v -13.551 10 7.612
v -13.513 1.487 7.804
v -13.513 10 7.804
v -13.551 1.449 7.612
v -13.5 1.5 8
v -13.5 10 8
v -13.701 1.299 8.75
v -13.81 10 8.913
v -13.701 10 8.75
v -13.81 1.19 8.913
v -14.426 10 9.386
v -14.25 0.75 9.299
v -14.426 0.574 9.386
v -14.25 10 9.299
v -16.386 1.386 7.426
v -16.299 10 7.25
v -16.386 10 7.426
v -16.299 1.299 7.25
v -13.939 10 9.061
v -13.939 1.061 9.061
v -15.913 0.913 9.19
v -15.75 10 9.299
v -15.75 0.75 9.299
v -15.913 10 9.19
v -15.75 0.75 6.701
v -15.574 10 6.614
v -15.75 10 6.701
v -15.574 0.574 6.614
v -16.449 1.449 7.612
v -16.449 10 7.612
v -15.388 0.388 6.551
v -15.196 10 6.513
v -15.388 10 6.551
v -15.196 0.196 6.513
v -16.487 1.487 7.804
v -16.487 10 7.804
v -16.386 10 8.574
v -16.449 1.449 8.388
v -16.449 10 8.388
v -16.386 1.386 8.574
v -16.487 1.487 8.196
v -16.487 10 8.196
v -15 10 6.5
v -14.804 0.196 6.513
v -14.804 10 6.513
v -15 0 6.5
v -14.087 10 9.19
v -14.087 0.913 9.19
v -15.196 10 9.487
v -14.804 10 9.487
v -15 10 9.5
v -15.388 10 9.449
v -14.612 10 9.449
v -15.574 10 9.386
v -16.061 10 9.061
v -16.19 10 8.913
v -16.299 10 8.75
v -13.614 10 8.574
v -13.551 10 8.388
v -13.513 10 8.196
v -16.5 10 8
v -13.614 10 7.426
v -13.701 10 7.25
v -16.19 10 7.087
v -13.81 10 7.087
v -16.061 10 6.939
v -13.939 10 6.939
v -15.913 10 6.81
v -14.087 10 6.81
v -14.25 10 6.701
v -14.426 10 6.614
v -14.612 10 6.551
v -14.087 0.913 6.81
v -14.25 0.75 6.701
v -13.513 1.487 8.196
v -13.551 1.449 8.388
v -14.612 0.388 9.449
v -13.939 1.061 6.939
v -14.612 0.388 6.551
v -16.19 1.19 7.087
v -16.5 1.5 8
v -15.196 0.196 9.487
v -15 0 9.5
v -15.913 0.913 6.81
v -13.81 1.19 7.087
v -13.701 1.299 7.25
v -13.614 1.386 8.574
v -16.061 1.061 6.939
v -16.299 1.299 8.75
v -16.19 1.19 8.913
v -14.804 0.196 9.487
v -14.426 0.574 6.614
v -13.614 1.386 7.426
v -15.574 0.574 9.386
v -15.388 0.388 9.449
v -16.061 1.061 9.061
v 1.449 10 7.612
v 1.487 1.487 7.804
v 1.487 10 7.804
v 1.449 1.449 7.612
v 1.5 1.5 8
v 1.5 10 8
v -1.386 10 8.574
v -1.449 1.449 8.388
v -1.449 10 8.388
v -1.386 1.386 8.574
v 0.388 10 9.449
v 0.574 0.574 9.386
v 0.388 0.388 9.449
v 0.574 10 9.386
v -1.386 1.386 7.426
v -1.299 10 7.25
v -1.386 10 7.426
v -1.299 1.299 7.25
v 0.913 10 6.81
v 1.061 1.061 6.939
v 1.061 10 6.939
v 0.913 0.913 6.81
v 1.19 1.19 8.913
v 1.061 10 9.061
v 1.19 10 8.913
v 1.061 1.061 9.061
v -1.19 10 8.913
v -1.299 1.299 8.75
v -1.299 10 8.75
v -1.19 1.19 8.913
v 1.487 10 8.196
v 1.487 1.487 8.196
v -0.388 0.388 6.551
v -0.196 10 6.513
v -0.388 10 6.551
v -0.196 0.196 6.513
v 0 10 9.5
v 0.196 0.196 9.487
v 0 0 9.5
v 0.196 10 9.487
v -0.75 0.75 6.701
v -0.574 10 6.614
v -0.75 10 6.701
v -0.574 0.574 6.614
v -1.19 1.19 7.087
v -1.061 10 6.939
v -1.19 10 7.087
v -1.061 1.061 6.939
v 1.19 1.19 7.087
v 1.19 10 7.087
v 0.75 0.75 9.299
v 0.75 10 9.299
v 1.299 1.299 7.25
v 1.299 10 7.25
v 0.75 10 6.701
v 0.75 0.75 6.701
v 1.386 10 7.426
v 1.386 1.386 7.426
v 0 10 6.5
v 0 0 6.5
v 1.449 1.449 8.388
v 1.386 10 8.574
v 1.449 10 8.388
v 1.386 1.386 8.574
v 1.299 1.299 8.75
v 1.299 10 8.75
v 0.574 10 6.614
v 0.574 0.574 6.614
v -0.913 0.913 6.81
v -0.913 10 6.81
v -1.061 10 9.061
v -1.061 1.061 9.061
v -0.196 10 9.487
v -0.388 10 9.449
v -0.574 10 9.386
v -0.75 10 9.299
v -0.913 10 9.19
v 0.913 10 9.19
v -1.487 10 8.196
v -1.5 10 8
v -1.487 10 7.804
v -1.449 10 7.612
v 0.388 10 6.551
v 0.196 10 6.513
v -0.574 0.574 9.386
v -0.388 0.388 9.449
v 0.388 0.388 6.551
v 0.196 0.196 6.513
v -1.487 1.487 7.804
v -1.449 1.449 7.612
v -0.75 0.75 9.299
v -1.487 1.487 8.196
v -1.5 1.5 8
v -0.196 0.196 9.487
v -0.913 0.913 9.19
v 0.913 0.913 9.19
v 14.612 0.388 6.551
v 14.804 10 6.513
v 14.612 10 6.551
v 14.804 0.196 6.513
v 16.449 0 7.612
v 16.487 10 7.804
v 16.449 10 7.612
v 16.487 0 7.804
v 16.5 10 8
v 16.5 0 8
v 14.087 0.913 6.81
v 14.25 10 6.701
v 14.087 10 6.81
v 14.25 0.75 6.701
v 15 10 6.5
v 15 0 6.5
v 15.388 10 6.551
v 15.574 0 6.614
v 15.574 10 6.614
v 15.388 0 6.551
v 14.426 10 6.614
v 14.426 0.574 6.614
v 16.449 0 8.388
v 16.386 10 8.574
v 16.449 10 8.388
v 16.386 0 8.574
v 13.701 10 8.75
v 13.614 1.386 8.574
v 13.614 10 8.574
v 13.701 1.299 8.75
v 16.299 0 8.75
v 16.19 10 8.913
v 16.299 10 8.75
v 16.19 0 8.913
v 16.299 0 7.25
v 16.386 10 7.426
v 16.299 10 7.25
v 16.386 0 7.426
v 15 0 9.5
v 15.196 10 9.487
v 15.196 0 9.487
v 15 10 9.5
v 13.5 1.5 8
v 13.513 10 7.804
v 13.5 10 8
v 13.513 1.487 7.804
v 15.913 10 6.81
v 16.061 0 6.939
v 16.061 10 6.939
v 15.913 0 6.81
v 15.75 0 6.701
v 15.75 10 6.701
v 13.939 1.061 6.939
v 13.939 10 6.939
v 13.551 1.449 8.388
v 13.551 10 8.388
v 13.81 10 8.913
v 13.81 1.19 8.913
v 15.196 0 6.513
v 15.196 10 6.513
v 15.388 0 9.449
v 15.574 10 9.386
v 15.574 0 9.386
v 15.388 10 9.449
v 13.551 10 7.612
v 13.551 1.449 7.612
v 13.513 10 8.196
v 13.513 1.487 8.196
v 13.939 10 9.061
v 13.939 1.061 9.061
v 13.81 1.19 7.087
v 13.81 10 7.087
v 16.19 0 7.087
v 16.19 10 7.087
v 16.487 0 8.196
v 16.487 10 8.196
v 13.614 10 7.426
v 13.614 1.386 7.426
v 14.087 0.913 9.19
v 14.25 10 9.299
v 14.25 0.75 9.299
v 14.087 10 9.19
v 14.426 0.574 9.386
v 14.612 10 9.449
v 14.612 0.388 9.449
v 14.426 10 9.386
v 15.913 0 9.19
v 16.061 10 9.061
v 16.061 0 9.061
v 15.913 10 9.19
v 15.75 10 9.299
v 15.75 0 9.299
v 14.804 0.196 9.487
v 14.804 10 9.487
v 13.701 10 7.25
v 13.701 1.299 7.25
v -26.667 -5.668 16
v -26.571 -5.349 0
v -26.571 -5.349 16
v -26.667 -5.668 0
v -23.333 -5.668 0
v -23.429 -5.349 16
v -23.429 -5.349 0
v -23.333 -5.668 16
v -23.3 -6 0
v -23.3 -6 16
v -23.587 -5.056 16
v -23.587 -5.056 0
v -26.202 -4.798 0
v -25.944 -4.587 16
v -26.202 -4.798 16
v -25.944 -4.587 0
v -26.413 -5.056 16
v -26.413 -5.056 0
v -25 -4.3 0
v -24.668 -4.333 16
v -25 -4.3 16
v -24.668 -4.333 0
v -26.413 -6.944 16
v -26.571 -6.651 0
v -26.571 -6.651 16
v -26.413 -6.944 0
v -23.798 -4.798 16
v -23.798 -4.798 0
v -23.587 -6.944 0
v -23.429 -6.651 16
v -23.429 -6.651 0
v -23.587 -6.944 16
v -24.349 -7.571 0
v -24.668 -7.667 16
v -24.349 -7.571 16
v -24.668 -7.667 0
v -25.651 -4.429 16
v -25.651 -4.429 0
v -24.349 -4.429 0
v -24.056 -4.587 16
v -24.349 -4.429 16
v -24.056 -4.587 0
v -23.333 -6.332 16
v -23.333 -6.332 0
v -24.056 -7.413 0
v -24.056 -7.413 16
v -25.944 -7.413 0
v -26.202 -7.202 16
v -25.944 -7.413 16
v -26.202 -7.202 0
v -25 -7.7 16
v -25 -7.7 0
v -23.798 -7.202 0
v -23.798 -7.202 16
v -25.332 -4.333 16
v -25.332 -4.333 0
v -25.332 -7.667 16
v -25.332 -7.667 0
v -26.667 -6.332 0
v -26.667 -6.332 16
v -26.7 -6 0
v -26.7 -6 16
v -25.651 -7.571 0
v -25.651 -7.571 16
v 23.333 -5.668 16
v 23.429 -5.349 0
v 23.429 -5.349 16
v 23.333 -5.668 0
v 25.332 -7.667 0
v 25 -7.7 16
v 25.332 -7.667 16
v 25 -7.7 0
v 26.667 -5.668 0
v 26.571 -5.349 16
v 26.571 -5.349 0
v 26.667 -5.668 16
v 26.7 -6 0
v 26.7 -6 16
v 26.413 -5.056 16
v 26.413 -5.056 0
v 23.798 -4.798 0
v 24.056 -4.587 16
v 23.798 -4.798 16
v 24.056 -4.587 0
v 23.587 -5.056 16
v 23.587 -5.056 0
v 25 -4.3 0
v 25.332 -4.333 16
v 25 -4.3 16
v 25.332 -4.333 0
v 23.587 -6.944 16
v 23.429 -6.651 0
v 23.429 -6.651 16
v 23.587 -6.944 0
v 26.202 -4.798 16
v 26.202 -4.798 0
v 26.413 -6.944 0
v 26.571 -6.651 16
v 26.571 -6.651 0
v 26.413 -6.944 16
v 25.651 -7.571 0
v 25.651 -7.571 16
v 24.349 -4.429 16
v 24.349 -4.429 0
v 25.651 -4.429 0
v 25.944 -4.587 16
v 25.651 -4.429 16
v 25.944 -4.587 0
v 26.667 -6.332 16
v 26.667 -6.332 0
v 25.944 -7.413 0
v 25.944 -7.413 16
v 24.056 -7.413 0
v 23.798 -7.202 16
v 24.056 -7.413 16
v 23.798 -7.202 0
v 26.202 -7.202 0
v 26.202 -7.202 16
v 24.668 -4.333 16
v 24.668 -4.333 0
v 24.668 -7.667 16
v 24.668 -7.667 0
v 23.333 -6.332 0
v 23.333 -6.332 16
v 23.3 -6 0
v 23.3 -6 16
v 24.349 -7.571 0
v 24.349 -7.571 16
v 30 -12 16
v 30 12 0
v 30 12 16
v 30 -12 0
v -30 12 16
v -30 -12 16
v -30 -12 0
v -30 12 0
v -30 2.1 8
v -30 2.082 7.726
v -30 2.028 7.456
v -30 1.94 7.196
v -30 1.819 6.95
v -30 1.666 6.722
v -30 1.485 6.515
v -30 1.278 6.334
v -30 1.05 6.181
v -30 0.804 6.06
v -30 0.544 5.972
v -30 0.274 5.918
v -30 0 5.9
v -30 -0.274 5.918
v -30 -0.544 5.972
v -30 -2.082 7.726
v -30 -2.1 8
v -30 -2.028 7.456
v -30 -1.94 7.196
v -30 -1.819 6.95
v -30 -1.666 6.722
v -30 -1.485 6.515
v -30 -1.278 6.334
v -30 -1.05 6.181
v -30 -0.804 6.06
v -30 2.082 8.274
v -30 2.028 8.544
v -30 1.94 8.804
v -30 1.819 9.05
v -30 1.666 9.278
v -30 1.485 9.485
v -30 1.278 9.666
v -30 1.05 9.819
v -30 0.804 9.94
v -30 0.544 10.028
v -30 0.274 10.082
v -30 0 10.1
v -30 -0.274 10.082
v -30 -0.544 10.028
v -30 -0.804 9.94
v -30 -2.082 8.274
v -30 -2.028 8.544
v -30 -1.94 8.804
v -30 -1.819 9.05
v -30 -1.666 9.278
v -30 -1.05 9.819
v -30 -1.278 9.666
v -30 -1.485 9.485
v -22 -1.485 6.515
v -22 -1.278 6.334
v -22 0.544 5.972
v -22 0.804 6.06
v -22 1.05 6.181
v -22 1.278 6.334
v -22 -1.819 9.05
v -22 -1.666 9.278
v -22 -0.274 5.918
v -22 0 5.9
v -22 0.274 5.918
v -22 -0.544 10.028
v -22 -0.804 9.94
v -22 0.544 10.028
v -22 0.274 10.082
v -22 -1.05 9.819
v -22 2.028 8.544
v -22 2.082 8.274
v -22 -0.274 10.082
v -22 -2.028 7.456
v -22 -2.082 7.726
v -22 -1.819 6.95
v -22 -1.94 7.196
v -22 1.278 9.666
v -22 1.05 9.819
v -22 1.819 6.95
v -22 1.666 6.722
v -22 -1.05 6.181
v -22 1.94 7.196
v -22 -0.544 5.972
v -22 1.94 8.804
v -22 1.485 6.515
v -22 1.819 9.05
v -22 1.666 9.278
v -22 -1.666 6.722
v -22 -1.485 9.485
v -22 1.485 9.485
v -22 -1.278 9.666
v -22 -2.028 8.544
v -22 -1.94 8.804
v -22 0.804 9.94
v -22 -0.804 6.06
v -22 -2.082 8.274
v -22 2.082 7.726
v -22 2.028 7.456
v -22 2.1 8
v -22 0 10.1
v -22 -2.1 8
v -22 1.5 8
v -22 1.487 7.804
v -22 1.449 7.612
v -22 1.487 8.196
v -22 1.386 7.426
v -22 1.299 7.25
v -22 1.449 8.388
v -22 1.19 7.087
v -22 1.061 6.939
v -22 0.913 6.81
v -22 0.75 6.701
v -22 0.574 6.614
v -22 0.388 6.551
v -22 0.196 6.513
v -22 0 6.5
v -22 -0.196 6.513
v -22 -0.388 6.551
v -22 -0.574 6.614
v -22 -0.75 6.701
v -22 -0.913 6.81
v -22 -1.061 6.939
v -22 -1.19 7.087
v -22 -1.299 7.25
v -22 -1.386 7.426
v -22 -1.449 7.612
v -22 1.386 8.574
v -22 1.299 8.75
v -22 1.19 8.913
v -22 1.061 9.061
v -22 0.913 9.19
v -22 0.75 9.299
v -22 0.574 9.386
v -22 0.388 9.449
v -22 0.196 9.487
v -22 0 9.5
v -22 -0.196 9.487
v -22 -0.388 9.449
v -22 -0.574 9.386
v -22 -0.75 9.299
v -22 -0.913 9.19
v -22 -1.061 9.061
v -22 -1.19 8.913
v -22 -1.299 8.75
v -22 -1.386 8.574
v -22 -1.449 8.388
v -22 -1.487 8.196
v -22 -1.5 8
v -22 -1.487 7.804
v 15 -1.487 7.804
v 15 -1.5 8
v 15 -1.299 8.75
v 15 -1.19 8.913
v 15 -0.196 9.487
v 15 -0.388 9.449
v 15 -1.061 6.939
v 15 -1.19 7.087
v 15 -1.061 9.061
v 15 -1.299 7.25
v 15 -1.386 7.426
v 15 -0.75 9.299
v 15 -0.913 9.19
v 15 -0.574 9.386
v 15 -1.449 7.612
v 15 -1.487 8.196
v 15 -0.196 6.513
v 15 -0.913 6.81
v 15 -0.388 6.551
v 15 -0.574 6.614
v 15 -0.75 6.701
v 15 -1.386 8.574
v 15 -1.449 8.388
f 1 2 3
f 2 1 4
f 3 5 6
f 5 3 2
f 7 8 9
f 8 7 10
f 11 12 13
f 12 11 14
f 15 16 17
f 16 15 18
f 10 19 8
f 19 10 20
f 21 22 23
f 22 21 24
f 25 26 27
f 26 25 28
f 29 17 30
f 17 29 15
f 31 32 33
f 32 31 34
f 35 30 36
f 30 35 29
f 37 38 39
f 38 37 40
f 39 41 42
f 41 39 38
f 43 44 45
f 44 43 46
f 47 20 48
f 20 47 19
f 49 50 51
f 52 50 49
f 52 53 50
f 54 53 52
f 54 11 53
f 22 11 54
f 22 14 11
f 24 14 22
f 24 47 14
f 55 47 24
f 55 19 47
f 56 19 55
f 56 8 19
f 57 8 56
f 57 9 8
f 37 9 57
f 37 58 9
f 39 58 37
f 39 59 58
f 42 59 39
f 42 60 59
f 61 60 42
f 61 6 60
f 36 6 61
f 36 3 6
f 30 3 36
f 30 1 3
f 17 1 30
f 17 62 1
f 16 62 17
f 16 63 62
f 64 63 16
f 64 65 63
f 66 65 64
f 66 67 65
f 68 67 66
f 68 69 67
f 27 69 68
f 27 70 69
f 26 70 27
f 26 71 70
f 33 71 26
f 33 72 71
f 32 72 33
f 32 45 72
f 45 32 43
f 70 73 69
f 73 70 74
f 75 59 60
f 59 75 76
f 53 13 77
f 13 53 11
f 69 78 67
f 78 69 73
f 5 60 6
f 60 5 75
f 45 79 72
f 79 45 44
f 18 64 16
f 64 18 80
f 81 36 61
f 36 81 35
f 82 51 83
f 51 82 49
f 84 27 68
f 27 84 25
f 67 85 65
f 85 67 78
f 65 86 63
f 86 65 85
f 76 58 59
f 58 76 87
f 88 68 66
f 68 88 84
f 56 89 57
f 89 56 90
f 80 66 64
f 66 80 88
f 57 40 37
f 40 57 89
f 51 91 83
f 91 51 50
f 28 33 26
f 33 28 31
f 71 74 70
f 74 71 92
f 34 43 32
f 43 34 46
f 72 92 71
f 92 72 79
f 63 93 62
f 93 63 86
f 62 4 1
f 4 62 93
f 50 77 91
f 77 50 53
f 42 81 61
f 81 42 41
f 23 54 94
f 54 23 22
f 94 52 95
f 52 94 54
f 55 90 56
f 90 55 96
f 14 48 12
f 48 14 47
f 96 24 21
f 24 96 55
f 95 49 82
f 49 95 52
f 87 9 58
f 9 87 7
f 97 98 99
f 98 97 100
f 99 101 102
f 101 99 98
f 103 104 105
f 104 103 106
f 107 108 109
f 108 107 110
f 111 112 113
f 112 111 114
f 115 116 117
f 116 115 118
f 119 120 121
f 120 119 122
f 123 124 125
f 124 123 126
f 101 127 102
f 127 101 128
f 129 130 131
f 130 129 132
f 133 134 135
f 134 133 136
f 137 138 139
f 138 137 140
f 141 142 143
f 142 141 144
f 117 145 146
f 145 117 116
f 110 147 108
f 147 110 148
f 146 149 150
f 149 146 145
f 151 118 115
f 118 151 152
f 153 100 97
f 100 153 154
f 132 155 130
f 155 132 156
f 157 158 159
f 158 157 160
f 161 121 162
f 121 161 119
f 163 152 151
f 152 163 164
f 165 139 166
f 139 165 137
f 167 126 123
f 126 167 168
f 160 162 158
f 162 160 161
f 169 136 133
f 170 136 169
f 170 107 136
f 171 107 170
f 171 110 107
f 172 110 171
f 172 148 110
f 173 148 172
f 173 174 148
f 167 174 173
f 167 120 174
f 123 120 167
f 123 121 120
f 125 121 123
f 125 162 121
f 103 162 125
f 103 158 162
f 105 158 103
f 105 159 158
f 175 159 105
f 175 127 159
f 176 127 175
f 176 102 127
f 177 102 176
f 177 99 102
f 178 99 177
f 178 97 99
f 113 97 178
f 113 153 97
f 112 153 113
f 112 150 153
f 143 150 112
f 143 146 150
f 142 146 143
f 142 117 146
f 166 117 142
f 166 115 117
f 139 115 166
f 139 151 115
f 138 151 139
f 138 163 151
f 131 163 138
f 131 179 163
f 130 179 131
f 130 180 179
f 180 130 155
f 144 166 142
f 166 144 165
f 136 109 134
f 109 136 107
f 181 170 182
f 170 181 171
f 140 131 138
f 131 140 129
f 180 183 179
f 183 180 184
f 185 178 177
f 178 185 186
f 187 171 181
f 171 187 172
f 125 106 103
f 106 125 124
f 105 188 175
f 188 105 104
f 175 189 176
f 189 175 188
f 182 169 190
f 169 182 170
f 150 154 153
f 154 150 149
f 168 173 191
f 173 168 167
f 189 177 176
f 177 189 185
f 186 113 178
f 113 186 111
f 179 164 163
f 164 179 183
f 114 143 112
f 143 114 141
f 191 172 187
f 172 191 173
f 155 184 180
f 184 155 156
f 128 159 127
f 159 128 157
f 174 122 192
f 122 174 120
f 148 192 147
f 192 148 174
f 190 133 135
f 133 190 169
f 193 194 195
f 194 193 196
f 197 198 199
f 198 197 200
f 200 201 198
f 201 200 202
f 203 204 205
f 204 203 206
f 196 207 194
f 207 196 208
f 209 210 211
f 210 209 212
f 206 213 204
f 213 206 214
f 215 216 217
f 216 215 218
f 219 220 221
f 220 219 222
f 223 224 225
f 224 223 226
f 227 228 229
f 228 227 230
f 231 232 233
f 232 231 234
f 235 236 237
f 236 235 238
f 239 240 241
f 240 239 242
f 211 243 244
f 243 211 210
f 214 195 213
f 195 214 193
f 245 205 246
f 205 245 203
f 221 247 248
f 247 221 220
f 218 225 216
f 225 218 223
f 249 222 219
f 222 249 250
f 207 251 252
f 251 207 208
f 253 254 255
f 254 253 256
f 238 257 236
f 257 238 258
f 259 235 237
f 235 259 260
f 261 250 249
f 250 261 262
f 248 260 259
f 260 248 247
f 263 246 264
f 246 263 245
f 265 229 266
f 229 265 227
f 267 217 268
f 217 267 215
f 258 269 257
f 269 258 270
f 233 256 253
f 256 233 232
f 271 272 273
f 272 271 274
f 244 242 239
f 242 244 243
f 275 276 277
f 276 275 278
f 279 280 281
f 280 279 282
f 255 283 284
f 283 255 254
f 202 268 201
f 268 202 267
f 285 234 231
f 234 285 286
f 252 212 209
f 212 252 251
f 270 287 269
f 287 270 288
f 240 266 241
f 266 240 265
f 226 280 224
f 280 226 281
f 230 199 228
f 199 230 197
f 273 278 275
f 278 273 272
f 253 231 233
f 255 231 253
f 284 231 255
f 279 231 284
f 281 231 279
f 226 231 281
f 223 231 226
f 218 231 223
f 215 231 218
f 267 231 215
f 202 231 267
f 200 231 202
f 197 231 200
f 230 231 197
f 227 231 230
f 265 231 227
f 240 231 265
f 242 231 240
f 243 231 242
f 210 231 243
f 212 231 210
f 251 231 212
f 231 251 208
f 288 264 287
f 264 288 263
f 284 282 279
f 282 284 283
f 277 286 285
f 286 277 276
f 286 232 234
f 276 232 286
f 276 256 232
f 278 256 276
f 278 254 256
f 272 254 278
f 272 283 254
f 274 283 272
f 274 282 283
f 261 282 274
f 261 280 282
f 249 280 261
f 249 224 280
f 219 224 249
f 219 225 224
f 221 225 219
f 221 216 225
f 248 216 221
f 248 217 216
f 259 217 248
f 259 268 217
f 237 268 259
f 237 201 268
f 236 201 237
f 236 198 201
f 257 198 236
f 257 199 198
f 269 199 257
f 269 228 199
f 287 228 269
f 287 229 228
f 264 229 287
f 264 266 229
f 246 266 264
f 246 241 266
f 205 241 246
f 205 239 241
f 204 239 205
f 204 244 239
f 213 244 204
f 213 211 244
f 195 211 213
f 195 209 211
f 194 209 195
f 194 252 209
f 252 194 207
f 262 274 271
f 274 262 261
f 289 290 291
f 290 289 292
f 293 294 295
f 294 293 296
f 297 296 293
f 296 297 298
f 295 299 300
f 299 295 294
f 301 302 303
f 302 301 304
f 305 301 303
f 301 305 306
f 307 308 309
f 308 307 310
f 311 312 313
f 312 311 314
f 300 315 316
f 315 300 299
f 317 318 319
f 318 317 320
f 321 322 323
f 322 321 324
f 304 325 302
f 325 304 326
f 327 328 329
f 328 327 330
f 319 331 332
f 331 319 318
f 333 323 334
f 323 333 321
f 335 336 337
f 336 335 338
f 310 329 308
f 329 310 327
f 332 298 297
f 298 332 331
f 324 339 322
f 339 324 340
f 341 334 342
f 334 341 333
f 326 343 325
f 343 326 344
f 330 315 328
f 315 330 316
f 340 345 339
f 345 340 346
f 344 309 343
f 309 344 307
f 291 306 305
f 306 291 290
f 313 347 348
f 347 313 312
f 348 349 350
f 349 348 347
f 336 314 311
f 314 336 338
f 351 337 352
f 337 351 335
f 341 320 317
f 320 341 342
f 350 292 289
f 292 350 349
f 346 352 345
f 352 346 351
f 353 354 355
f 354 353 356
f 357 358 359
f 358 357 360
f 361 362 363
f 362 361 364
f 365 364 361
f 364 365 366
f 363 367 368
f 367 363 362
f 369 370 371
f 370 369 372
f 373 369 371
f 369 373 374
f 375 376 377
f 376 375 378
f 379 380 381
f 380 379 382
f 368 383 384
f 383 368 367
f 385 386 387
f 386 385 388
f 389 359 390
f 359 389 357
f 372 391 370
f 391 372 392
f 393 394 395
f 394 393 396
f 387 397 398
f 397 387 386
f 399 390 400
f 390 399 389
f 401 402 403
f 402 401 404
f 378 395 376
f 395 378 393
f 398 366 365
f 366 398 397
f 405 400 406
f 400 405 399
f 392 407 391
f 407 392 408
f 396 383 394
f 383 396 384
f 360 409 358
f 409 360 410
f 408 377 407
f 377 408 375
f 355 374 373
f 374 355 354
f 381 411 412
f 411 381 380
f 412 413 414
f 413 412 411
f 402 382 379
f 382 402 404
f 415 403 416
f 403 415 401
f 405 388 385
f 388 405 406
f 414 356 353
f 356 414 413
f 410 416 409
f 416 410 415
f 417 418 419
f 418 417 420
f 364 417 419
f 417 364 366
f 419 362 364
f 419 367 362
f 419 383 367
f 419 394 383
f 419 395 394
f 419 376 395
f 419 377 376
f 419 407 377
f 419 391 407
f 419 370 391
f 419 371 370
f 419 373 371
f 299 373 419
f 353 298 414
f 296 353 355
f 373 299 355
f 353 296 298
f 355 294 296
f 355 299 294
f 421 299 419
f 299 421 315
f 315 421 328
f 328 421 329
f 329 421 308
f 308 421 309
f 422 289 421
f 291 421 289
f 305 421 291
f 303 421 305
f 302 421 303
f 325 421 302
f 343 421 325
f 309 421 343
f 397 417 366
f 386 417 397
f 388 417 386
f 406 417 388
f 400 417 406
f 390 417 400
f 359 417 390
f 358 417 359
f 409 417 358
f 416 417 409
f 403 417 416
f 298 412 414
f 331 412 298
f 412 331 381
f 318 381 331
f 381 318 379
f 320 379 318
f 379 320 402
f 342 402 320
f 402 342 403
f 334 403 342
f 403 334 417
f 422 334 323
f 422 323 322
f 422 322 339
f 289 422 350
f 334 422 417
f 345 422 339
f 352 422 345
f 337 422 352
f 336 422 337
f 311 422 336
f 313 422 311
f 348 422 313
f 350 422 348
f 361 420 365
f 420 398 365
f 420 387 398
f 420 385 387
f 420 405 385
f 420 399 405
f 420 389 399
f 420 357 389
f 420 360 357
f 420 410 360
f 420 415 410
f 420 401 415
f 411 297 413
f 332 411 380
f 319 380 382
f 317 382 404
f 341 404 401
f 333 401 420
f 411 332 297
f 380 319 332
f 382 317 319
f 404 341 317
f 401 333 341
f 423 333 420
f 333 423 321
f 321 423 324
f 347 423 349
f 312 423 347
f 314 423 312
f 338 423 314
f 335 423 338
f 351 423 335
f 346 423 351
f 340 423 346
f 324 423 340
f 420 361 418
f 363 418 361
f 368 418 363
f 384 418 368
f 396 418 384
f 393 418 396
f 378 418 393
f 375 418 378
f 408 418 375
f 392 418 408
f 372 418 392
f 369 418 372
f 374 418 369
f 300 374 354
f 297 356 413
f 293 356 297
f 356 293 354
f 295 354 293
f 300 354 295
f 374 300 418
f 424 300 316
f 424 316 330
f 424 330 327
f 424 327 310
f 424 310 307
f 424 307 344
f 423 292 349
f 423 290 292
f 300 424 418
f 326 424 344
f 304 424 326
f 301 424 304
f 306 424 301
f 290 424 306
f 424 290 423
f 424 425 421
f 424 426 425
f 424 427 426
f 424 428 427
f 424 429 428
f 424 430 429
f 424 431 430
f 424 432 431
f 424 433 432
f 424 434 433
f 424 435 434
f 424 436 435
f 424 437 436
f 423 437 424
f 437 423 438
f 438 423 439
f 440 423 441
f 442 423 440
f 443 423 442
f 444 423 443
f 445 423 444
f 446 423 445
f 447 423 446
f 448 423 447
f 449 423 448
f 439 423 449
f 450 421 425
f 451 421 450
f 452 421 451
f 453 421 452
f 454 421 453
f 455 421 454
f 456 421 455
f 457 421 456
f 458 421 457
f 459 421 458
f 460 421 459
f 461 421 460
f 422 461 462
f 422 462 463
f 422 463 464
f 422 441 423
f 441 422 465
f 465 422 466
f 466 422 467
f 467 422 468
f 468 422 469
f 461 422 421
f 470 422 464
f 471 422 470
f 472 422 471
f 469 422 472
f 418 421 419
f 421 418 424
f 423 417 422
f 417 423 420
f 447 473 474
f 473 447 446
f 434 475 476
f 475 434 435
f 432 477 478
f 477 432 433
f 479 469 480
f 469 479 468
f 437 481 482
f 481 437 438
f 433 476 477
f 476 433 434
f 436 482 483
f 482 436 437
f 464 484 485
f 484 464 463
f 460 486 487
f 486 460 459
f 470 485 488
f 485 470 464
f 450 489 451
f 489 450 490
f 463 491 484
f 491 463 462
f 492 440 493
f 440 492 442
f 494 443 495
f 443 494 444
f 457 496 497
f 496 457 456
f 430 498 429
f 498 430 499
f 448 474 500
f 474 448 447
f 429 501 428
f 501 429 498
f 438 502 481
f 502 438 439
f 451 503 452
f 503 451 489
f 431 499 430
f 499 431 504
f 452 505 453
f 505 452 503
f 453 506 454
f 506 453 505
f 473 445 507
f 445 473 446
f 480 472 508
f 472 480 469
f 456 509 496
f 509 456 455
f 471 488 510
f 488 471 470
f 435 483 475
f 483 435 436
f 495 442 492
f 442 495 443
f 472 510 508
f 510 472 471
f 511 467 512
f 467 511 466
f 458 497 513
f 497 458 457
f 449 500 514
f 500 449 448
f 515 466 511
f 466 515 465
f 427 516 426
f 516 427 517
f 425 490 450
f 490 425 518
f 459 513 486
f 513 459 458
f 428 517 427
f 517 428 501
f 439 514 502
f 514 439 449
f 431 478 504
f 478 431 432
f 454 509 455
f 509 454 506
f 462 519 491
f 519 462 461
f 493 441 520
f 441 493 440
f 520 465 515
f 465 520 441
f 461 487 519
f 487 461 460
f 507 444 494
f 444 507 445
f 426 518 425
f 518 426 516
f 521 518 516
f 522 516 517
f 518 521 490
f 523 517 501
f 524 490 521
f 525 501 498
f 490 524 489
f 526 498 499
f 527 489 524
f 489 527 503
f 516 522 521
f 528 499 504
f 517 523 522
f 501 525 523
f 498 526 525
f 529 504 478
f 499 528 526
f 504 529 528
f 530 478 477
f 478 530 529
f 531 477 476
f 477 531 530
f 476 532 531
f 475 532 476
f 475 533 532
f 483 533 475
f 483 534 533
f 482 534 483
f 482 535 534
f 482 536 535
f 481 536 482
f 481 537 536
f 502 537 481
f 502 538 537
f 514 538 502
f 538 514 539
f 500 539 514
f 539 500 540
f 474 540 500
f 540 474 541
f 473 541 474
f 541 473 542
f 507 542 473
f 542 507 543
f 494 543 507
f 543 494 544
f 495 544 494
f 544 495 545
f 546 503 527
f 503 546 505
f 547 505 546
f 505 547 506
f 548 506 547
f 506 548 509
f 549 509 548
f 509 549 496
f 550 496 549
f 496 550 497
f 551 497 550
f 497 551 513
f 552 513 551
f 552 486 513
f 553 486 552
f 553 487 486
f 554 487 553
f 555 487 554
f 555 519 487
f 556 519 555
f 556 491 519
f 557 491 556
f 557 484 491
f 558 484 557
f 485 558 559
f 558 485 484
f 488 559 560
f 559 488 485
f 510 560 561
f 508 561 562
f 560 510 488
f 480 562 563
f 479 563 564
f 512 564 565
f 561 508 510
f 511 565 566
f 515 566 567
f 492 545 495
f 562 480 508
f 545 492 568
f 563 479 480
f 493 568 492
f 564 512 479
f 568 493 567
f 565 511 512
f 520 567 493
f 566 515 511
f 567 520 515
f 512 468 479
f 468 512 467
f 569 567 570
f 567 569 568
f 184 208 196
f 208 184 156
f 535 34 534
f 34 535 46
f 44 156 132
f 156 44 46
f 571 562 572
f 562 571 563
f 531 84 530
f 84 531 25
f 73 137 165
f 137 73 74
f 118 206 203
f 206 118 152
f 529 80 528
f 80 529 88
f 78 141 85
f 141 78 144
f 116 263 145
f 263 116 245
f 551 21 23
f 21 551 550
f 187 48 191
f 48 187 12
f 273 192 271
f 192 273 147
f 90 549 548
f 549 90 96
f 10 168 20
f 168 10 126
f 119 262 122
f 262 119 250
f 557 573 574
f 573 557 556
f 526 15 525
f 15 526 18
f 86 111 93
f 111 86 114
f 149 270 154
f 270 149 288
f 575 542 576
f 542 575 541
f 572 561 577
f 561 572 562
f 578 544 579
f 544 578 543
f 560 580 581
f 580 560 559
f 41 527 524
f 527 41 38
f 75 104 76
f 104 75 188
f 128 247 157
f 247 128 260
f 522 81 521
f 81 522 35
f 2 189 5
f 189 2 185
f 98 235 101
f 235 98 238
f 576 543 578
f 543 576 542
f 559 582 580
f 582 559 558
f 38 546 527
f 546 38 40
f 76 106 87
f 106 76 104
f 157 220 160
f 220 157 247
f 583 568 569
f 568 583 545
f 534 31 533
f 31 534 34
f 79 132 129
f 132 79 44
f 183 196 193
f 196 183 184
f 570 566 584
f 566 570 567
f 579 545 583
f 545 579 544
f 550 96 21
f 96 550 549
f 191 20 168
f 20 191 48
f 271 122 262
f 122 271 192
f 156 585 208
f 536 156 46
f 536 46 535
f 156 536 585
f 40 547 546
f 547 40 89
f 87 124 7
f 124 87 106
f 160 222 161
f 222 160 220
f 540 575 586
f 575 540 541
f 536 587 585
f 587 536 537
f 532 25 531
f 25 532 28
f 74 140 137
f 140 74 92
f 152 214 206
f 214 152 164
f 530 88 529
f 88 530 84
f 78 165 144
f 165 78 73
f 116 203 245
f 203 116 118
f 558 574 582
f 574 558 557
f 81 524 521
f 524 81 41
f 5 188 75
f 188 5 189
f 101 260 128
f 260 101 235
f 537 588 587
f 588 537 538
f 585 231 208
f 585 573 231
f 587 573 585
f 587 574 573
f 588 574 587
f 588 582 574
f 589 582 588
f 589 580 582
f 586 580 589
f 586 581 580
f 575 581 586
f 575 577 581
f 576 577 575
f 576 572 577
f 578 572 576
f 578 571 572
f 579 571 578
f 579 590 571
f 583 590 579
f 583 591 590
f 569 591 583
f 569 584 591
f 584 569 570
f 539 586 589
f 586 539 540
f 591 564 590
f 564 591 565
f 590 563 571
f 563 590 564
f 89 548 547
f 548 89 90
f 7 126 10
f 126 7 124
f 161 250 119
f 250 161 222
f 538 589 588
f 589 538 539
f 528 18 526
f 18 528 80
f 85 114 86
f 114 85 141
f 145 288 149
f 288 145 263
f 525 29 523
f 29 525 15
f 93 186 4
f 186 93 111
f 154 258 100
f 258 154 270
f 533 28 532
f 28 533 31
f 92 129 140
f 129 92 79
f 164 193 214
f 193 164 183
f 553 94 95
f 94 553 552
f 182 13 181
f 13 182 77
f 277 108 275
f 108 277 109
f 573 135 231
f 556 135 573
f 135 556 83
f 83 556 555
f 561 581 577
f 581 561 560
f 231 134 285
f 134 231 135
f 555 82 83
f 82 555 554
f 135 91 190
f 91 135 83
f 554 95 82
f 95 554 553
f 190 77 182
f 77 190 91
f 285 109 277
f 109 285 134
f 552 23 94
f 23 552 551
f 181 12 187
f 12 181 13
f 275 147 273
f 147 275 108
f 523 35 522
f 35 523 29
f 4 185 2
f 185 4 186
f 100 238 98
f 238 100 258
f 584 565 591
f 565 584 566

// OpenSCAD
// KNOWN-WRONG PART (must fail): the outlet channels stop 2 mm short of the +Y face, with no sockets
// Manifold block: one tubing inlet split into three outlets through internal channels
// Category: hardware. 3 mm channels in the mid-plane: an inlet socket on the -X face feeds a main
// channel that ends inside the block; three branches run to sockets on the +Y face.
// Print: PETG, lying on its bottom face, 0.15 mm layers, 100 % infill (watertight walls);
// the 3 mm channels bridge cleanly. Leak-test before use; glue the tubing into the sockets.
// SPDX-License-Identifier: CERN-OHL-P-2.0

/* [Manifold] */
block = [60, 24, 16];     // X, Y, Z [mm], centred in X and Y
ch_z = 8;                 // channel mid-plane
ch_d = 3;
sock_d = 4.2;             // socket for 4 mm OD tubing
inlet_sock = 8;           // inlet socket depth (from the -X face)
outlet_sock = 6;          // outlet socket depth (from the +Y face)
main_end = 15;            // the main channel stops at x = 15
outlets_x = [-15, 0, 15];
screw_d = 3.4;            // M3 clearance
screws = [[-25, -6], [25, -6]];

/* [Hidden] */
eps = 0.01;

difference() {
    translate([-block.x / 2, -block.y / 2, 0]) cube(block);
    // inlet socket and main channel along +X
    translate([-block.x / 2 - 1, 0, ch_z]) rotate([0, 90, 0]) cylinder(d = sock_d, h = inlet_sock + 1, $fn = 48);
    translate([-block.x / 2 - 1, 0, ch_z]) rotate([0, 90, 0]) cylinder(d = ch_d, h = block.x / 2 + main_end + 1, $fn = 48);
    // outlet branches along +Y, each ending in a socket
    for (x = outlets_x) {
        translate([x, 0, ch_z]) rotate([-90, 0, 0]) cylinder(d = ch_d, h = block.y / 2 - 2, $fn = 48);
    }
    for (p = screws) translate([p.x, p.y, -1]) cylinder(d = screw_d, h = block.z + 2, $fn = 32);
}
